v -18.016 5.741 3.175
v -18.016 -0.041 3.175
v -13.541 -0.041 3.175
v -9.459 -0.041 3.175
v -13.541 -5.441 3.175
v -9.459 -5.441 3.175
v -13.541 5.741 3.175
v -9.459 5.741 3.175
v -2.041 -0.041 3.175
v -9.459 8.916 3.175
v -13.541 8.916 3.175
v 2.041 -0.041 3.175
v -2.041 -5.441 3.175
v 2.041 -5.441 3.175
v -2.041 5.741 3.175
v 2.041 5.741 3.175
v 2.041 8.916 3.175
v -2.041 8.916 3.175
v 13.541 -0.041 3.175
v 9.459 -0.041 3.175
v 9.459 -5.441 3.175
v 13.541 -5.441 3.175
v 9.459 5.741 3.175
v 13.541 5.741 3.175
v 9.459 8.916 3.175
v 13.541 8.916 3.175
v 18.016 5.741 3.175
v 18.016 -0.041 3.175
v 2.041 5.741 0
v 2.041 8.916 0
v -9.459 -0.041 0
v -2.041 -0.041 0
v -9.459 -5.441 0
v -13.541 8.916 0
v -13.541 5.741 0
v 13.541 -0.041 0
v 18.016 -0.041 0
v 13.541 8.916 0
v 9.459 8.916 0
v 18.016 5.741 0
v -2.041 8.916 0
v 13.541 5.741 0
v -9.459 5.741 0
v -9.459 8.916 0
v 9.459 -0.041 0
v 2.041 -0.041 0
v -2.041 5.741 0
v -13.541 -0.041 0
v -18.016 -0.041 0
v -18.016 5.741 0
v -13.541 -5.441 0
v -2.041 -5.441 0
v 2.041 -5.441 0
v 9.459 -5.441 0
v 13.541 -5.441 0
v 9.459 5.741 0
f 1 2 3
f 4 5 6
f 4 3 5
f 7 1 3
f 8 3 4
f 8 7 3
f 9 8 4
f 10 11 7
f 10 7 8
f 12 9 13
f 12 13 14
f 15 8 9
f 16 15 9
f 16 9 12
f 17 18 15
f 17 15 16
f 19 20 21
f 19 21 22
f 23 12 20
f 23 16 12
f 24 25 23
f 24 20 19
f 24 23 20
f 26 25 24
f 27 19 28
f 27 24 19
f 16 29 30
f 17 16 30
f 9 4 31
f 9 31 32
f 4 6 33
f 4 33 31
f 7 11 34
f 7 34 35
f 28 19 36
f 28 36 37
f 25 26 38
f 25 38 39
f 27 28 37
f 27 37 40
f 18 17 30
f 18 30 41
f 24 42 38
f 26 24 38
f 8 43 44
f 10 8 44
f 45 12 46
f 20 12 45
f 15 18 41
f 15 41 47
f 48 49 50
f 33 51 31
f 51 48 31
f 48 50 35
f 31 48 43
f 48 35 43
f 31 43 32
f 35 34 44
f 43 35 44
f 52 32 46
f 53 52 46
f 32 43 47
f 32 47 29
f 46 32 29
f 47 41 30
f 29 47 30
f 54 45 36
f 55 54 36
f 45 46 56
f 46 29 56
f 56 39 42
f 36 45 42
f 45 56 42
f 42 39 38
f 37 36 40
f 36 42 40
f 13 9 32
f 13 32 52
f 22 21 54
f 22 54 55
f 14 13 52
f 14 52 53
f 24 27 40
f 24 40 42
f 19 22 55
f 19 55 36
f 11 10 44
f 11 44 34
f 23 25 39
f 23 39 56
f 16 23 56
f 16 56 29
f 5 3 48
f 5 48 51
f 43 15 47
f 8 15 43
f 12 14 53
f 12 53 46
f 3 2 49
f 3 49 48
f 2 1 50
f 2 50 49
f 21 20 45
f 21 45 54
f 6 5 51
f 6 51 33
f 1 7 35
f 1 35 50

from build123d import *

# Parameters (mm, degrees)
SKETCH1_W           = 4
SKETCH1_H           = 3.175
SKETCH1_W_2         = 42.3
SKETCH1_H_2         = 5.7
SKETCH1_H_3         = 2.225
BOSS_EXTRUDE1_DEPTH = 3.175
CUT_EXTRUDE2_DEPTH  = 23.175
BOSS_EXTRUDE2_DEPTH = 3.175


with BuildPart() as part:
    # Sketch1 → Boss-Extrude1 (new body)
    with BuildSketch(Plane.XY):
        with Locations((-11.5, -1.5875)):
            Rectangle(SKETCH1_W, SKETCH1_H)
        with Locations((-11.5, 7.2875)):
            Rectangle(SKETCH1_W, SKETCH1_H)
        with Locations((0, 7.2875)):
            Rectangle(SKETCH1_W, SKETCH1_H)
        with Locations((0, -1.5875)):
            Rectangle(SKETCH1_W, SKETCH1_H)
        with Locations((11.5, 7.2875)):
            Rectangle(SKETCH1_W, SKETCH1_H)
        with Locations((11.5, -1.5875)):
            Rectangle(SKETCH1_W, SKETCH1_H)
        with Locations((0, 2.85)):
            Rectangle(SKETCH1_W_2, SKETCH1_H_2)
        with Locations((-11.5, -4.2875)):
            Rectangle(SKETCH1_W, SKETCH1_H_3)
        with Locations((0, -4.2875)):
            Rectangle(SKETCH1_W, SKETCH1_H_3)
        with Locations((11.5, -4.2875)):
            Rectangle(SKETCH1_W, SKETCH1_H_3)
    extrude(amount=BOSS_EXTRUDE1_DEPTH)

    # Sketch2 → Cut-Extrude2 (cut)
    with BuildSketch(Plane(origin=(0, 5.7, 0), x_dir=(1, 0, 0), z_dir=(0, 1, 0))):
        Polygon((-17.975, 0), (-21.15, 0), (-21.15, -3.175), align=None)
        Polygon((-17.975, -3.175), (-17.975, 0), (-21.15, -3.175), align=None)
        Polygon((21.15, -3.175), (17.975, -3.175), (17.975, 0), align=None)
        Polygon((21.15, -3.175), (17.975, 0), (21.15, 0), align=None)
    extrude(amount=-CUT_EXTRUDE2_DEPTH, mode=Mode.SUBTRACT)

    # Sketch3 → Boss-Extrude2 (add)
    with BuildSketch(Plane.XY.offset(3.175)):
        Polygon((-13.54064, -5.44064), (-9.45936, -5.44064), (-9.45936, -0.04064), (-2.04064, -0.04064), (-2.04064, -5.44064), (2.04064, -5.44064), (2.04064, -0.04064), (9.45936, -0.04064), (9.45936, -5.44064), (13.54064, -5.44064), (13.54064, -0.04064), (18.01564, -0.04064), (18.01564, 5.74064), (13.54064, 5.74064), (13.54064, 8.91564), (9.45936, 8.91564), (9.45936, 5.74064), (2.04064, 5.74064), (2.04064, 8.91564), (-2.04064, 8.91564), (-2.04064, 5.74064), (-9.45936, 5.74064), (-9.45936, 8.91564), (-13.54064, 8.91564), (-13.54064, 5.74064), (-18.01564, 5.74064), (-18.01564, -0.04064), (-13.54064, -0.04064), align=None)
    extrude(amount=-BOSS_EXTRUDE2_DEPTH)


solid = part.part
